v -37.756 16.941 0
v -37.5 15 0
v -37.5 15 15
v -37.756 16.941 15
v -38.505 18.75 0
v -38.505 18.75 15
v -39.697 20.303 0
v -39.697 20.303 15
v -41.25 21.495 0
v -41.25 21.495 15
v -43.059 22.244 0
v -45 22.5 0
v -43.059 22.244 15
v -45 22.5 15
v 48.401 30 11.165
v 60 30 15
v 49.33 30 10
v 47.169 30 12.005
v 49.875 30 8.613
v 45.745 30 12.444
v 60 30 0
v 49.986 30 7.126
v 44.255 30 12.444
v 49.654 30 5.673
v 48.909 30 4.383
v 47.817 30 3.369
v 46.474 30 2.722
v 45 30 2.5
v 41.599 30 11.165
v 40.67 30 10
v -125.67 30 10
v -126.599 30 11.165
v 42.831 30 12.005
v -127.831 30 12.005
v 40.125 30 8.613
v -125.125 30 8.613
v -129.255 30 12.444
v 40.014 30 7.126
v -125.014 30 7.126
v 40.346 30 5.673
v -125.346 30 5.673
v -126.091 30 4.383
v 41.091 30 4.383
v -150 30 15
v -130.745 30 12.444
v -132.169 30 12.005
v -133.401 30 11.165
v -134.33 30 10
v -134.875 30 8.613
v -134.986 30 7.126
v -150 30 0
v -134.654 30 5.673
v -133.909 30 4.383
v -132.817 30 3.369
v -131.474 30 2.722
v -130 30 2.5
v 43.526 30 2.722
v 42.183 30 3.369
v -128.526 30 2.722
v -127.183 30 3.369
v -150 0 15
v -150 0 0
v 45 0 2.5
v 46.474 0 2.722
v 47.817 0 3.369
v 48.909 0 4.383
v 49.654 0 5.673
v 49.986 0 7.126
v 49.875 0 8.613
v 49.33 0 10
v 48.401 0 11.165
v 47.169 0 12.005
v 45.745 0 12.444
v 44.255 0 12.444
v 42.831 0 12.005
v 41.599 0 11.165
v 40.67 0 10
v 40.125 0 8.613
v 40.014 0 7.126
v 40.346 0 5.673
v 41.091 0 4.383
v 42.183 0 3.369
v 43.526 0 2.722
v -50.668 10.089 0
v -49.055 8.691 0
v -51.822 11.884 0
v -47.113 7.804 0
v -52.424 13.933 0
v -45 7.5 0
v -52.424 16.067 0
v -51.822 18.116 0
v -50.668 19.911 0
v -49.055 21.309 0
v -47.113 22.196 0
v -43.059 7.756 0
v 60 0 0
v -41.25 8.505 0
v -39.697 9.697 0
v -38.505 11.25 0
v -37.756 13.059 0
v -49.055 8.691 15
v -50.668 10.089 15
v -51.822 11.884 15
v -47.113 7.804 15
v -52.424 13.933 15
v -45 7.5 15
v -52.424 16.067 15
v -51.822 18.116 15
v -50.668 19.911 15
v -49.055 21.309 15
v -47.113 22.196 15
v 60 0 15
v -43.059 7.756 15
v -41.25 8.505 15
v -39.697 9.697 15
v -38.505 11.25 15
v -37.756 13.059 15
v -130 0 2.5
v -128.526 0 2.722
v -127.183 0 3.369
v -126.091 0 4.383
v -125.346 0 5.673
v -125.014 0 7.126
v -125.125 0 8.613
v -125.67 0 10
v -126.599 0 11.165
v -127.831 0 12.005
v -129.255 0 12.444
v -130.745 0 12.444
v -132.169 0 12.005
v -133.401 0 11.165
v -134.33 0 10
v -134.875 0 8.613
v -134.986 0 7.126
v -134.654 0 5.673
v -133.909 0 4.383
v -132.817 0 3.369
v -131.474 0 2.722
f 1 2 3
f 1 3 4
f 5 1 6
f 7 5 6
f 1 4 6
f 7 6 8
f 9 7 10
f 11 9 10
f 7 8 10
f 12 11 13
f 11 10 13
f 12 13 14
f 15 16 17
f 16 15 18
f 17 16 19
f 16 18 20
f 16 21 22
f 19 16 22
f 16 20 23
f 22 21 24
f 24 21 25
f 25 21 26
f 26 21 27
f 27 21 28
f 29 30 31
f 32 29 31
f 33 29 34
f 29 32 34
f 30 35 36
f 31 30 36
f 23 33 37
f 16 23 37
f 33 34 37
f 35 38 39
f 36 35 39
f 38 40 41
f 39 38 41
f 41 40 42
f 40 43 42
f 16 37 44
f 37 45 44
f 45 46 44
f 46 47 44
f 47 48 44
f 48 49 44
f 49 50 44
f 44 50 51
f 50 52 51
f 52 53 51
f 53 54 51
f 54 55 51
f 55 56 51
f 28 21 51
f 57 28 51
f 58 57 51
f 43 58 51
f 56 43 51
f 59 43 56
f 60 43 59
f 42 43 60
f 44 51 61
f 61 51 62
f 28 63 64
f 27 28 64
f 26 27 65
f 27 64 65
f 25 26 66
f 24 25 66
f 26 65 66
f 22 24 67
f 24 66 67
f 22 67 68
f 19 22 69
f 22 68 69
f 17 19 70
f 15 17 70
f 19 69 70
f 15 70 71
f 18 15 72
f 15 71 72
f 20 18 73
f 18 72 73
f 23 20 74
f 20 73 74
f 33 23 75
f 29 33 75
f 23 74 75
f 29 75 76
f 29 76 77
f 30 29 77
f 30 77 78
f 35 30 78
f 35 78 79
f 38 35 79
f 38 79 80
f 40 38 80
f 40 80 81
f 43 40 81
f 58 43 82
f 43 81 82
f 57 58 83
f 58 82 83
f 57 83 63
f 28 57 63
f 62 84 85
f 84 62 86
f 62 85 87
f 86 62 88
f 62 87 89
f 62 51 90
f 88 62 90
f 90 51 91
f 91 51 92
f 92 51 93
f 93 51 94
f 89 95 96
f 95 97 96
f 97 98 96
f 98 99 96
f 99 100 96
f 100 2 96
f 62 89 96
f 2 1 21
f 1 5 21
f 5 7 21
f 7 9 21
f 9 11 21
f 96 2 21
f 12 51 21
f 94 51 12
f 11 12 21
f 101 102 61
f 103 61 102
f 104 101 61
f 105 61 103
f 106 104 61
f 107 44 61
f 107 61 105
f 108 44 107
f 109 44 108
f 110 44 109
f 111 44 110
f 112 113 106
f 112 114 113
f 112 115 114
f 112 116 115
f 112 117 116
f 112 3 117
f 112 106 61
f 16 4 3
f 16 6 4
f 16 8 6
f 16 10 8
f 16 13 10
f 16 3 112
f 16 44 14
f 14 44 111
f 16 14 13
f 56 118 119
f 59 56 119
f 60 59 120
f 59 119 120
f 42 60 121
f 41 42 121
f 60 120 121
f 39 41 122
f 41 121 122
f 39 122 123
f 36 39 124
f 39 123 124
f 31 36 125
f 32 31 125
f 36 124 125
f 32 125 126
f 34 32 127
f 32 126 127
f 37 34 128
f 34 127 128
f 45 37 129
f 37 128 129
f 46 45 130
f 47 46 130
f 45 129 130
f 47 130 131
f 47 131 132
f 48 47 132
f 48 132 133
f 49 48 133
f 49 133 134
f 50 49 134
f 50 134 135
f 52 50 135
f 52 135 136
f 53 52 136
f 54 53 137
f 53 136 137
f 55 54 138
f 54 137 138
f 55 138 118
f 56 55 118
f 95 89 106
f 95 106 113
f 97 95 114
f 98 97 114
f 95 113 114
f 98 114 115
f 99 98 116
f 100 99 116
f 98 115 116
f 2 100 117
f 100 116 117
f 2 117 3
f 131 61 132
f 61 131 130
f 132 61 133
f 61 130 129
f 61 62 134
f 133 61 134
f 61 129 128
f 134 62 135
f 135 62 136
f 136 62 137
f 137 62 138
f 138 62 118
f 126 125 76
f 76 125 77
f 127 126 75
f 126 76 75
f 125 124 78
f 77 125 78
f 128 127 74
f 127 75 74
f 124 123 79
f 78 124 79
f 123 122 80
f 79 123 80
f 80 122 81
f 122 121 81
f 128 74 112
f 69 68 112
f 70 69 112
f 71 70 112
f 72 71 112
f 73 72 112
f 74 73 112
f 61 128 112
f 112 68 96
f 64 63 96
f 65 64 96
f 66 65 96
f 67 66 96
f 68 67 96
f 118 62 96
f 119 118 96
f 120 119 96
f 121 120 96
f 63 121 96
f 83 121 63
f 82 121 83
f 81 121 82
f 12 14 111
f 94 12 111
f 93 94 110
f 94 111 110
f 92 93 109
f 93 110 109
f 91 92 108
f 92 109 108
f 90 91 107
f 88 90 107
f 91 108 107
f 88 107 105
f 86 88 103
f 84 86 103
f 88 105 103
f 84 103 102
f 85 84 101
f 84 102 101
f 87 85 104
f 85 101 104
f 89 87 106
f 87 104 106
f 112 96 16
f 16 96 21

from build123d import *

# Parameters (mm, degrees)
RESSALTO_EXTRUS_O1_DEPTH = 15
CORTE_EXTRUS_O1_DEPTH    = 15
ESBO_O3_R                = 5
CORTE_EXTRUS_O2_DEPTH    = 30


with BuildPart() as part:
    # Esboço1 → Ressalto-extrusão1 (new body)
    with BuildSketch(Plane.XY):
        Polygon((0, 0), (60, 0), (60, 30), (-150, 30), (-150, 0), align=None)
    extrude(amount=RESSALTO_EXTRUS_O1_DEPTH)

    # Esboço2 → Corte-extrusão1 (cut)
    with BuildSketch(Plane.XY.offset(15)):
        with BuildLine():
            ThreePointArc((-45, 22.5), (-52.5, 15), (-45, 7.5))
            Line((-45, 7.5), (-45, 22.5))
        make_face()
        with BuildLine():
            Line((-45, 22.5), (-45, 7.5))
            ThreePointArc((-45, 7.5), (-39.696699141, 9.696699141), (-37.5, 15))
            ThreePointArc((-37.5, 15), (-39.696699141, 20.303300859), (-45, 22.5))
        make_face()
    extrude(amount=-CORTE_EXTRUS_O1_DEPTH, mode=Mode.SUBTRACT)

    # Esboço3 → Corte-extrusão2 (cut)
    with BuildSketch(Plane(origin=(0, 0, 0), x_dir=(-1, 0, 0), z_dir=(0, -1, 0))):
        with Locations(Location((130, -7.5, 0), (0, 0, 90))):
            Circle(ESBO_O3_R)
        with Locations(Location((-45, -7.5, 0), (0, 0, 90))):
            Circle(ESBO_O3_R)
    extrude(amount=-CORTE_EXTRUS_O2_DEPTH, mode=Mode.SUBTRACT)


solid = part.part
